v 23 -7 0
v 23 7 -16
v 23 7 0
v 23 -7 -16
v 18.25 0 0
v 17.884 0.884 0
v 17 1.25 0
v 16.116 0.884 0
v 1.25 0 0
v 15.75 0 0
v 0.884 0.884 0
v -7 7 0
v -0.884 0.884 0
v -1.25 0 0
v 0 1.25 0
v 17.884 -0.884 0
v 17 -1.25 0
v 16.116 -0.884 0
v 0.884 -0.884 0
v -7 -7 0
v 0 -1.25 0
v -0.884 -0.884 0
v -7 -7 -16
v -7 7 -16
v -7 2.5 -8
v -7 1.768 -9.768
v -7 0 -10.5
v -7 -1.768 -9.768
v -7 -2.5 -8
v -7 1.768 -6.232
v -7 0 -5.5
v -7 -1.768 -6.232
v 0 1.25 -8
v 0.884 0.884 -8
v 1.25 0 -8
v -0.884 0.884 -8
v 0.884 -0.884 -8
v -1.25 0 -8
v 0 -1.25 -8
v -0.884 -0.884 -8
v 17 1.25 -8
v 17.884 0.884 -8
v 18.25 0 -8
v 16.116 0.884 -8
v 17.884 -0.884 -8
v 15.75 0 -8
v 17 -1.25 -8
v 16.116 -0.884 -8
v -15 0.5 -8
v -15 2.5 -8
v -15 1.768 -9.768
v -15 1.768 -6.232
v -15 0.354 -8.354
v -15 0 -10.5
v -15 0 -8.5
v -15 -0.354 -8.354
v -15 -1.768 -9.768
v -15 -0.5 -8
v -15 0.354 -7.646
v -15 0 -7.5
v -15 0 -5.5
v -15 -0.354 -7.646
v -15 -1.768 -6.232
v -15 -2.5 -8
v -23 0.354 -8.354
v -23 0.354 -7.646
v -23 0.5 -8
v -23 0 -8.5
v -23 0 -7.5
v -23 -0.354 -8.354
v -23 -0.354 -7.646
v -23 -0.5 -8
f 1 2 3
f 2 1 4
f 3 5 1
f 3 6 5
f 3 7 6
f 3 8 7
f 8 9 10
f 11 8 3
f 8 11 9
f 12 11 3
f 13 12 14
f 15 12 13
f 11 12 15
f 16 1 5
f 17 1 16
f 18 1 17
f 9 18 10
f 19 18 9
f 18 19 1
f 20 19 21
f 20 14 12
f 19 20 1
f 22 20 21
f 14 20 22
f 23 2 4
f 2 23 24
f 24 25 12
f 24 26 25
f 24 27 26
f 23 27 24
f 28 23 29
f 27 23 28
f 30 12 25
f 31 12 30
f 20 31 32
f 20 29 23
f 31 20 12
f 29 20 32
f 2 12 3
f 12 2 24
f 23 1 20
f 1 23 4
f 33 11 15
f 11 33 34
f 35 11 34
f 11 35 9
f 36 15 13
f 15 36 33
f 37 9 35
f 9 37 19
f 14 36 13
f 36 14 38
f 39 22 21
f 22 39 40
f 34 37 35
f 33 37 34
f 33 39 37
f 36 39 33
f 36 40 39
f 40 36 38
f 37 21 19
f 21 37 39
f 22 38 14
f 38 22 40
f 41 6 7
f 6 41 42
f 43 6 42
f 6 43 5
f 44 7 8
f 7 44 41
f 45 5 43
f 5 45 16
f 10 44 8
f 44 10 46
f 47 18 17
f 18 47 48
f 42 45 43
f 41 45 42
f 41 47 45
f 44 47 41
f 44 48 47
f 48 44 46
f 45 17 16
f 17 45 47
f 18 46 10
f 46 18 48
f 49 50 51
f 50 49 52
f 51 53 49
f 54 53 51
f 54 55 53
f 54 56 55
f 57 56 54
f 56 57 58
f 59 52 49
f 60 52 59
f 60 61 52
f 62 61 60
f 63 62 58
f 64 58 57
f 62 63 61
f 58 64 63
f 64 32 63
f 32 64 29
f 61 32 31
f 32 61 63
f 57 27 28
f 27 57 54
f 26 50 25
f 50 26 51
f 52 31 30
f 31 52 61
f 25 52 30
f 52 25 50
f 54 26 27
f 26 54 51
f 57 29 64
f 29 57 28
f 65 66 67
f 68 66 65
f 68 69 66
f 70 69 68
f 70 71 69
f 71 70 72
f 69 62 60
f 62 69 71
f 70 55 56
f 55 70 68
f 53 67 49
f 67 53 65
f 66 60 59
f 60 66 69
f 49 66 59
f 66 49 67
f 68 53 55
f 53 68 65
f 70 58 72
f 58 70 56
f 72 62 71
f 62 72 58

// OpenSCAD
translate([-7,0,-16/2]) union()
{    
    difference()
    {
        translate([30/2,0,0]) cube([30,14,16], center = true);
        translate([7,0,0]) cylinder($fn= 8, h=20, r=2.5/2);
        translate([7+17,0,0]) cylinder($fn= 8, h=20, r=2.5/2);
    }

    rotate([0,-90,0]) cylinder($fn= 8, h=8, r=5/2);
    rotate([0,-90,0]) translate([0,0,8]) cylinder($fn= 8, h=8, r=1/2);
}
